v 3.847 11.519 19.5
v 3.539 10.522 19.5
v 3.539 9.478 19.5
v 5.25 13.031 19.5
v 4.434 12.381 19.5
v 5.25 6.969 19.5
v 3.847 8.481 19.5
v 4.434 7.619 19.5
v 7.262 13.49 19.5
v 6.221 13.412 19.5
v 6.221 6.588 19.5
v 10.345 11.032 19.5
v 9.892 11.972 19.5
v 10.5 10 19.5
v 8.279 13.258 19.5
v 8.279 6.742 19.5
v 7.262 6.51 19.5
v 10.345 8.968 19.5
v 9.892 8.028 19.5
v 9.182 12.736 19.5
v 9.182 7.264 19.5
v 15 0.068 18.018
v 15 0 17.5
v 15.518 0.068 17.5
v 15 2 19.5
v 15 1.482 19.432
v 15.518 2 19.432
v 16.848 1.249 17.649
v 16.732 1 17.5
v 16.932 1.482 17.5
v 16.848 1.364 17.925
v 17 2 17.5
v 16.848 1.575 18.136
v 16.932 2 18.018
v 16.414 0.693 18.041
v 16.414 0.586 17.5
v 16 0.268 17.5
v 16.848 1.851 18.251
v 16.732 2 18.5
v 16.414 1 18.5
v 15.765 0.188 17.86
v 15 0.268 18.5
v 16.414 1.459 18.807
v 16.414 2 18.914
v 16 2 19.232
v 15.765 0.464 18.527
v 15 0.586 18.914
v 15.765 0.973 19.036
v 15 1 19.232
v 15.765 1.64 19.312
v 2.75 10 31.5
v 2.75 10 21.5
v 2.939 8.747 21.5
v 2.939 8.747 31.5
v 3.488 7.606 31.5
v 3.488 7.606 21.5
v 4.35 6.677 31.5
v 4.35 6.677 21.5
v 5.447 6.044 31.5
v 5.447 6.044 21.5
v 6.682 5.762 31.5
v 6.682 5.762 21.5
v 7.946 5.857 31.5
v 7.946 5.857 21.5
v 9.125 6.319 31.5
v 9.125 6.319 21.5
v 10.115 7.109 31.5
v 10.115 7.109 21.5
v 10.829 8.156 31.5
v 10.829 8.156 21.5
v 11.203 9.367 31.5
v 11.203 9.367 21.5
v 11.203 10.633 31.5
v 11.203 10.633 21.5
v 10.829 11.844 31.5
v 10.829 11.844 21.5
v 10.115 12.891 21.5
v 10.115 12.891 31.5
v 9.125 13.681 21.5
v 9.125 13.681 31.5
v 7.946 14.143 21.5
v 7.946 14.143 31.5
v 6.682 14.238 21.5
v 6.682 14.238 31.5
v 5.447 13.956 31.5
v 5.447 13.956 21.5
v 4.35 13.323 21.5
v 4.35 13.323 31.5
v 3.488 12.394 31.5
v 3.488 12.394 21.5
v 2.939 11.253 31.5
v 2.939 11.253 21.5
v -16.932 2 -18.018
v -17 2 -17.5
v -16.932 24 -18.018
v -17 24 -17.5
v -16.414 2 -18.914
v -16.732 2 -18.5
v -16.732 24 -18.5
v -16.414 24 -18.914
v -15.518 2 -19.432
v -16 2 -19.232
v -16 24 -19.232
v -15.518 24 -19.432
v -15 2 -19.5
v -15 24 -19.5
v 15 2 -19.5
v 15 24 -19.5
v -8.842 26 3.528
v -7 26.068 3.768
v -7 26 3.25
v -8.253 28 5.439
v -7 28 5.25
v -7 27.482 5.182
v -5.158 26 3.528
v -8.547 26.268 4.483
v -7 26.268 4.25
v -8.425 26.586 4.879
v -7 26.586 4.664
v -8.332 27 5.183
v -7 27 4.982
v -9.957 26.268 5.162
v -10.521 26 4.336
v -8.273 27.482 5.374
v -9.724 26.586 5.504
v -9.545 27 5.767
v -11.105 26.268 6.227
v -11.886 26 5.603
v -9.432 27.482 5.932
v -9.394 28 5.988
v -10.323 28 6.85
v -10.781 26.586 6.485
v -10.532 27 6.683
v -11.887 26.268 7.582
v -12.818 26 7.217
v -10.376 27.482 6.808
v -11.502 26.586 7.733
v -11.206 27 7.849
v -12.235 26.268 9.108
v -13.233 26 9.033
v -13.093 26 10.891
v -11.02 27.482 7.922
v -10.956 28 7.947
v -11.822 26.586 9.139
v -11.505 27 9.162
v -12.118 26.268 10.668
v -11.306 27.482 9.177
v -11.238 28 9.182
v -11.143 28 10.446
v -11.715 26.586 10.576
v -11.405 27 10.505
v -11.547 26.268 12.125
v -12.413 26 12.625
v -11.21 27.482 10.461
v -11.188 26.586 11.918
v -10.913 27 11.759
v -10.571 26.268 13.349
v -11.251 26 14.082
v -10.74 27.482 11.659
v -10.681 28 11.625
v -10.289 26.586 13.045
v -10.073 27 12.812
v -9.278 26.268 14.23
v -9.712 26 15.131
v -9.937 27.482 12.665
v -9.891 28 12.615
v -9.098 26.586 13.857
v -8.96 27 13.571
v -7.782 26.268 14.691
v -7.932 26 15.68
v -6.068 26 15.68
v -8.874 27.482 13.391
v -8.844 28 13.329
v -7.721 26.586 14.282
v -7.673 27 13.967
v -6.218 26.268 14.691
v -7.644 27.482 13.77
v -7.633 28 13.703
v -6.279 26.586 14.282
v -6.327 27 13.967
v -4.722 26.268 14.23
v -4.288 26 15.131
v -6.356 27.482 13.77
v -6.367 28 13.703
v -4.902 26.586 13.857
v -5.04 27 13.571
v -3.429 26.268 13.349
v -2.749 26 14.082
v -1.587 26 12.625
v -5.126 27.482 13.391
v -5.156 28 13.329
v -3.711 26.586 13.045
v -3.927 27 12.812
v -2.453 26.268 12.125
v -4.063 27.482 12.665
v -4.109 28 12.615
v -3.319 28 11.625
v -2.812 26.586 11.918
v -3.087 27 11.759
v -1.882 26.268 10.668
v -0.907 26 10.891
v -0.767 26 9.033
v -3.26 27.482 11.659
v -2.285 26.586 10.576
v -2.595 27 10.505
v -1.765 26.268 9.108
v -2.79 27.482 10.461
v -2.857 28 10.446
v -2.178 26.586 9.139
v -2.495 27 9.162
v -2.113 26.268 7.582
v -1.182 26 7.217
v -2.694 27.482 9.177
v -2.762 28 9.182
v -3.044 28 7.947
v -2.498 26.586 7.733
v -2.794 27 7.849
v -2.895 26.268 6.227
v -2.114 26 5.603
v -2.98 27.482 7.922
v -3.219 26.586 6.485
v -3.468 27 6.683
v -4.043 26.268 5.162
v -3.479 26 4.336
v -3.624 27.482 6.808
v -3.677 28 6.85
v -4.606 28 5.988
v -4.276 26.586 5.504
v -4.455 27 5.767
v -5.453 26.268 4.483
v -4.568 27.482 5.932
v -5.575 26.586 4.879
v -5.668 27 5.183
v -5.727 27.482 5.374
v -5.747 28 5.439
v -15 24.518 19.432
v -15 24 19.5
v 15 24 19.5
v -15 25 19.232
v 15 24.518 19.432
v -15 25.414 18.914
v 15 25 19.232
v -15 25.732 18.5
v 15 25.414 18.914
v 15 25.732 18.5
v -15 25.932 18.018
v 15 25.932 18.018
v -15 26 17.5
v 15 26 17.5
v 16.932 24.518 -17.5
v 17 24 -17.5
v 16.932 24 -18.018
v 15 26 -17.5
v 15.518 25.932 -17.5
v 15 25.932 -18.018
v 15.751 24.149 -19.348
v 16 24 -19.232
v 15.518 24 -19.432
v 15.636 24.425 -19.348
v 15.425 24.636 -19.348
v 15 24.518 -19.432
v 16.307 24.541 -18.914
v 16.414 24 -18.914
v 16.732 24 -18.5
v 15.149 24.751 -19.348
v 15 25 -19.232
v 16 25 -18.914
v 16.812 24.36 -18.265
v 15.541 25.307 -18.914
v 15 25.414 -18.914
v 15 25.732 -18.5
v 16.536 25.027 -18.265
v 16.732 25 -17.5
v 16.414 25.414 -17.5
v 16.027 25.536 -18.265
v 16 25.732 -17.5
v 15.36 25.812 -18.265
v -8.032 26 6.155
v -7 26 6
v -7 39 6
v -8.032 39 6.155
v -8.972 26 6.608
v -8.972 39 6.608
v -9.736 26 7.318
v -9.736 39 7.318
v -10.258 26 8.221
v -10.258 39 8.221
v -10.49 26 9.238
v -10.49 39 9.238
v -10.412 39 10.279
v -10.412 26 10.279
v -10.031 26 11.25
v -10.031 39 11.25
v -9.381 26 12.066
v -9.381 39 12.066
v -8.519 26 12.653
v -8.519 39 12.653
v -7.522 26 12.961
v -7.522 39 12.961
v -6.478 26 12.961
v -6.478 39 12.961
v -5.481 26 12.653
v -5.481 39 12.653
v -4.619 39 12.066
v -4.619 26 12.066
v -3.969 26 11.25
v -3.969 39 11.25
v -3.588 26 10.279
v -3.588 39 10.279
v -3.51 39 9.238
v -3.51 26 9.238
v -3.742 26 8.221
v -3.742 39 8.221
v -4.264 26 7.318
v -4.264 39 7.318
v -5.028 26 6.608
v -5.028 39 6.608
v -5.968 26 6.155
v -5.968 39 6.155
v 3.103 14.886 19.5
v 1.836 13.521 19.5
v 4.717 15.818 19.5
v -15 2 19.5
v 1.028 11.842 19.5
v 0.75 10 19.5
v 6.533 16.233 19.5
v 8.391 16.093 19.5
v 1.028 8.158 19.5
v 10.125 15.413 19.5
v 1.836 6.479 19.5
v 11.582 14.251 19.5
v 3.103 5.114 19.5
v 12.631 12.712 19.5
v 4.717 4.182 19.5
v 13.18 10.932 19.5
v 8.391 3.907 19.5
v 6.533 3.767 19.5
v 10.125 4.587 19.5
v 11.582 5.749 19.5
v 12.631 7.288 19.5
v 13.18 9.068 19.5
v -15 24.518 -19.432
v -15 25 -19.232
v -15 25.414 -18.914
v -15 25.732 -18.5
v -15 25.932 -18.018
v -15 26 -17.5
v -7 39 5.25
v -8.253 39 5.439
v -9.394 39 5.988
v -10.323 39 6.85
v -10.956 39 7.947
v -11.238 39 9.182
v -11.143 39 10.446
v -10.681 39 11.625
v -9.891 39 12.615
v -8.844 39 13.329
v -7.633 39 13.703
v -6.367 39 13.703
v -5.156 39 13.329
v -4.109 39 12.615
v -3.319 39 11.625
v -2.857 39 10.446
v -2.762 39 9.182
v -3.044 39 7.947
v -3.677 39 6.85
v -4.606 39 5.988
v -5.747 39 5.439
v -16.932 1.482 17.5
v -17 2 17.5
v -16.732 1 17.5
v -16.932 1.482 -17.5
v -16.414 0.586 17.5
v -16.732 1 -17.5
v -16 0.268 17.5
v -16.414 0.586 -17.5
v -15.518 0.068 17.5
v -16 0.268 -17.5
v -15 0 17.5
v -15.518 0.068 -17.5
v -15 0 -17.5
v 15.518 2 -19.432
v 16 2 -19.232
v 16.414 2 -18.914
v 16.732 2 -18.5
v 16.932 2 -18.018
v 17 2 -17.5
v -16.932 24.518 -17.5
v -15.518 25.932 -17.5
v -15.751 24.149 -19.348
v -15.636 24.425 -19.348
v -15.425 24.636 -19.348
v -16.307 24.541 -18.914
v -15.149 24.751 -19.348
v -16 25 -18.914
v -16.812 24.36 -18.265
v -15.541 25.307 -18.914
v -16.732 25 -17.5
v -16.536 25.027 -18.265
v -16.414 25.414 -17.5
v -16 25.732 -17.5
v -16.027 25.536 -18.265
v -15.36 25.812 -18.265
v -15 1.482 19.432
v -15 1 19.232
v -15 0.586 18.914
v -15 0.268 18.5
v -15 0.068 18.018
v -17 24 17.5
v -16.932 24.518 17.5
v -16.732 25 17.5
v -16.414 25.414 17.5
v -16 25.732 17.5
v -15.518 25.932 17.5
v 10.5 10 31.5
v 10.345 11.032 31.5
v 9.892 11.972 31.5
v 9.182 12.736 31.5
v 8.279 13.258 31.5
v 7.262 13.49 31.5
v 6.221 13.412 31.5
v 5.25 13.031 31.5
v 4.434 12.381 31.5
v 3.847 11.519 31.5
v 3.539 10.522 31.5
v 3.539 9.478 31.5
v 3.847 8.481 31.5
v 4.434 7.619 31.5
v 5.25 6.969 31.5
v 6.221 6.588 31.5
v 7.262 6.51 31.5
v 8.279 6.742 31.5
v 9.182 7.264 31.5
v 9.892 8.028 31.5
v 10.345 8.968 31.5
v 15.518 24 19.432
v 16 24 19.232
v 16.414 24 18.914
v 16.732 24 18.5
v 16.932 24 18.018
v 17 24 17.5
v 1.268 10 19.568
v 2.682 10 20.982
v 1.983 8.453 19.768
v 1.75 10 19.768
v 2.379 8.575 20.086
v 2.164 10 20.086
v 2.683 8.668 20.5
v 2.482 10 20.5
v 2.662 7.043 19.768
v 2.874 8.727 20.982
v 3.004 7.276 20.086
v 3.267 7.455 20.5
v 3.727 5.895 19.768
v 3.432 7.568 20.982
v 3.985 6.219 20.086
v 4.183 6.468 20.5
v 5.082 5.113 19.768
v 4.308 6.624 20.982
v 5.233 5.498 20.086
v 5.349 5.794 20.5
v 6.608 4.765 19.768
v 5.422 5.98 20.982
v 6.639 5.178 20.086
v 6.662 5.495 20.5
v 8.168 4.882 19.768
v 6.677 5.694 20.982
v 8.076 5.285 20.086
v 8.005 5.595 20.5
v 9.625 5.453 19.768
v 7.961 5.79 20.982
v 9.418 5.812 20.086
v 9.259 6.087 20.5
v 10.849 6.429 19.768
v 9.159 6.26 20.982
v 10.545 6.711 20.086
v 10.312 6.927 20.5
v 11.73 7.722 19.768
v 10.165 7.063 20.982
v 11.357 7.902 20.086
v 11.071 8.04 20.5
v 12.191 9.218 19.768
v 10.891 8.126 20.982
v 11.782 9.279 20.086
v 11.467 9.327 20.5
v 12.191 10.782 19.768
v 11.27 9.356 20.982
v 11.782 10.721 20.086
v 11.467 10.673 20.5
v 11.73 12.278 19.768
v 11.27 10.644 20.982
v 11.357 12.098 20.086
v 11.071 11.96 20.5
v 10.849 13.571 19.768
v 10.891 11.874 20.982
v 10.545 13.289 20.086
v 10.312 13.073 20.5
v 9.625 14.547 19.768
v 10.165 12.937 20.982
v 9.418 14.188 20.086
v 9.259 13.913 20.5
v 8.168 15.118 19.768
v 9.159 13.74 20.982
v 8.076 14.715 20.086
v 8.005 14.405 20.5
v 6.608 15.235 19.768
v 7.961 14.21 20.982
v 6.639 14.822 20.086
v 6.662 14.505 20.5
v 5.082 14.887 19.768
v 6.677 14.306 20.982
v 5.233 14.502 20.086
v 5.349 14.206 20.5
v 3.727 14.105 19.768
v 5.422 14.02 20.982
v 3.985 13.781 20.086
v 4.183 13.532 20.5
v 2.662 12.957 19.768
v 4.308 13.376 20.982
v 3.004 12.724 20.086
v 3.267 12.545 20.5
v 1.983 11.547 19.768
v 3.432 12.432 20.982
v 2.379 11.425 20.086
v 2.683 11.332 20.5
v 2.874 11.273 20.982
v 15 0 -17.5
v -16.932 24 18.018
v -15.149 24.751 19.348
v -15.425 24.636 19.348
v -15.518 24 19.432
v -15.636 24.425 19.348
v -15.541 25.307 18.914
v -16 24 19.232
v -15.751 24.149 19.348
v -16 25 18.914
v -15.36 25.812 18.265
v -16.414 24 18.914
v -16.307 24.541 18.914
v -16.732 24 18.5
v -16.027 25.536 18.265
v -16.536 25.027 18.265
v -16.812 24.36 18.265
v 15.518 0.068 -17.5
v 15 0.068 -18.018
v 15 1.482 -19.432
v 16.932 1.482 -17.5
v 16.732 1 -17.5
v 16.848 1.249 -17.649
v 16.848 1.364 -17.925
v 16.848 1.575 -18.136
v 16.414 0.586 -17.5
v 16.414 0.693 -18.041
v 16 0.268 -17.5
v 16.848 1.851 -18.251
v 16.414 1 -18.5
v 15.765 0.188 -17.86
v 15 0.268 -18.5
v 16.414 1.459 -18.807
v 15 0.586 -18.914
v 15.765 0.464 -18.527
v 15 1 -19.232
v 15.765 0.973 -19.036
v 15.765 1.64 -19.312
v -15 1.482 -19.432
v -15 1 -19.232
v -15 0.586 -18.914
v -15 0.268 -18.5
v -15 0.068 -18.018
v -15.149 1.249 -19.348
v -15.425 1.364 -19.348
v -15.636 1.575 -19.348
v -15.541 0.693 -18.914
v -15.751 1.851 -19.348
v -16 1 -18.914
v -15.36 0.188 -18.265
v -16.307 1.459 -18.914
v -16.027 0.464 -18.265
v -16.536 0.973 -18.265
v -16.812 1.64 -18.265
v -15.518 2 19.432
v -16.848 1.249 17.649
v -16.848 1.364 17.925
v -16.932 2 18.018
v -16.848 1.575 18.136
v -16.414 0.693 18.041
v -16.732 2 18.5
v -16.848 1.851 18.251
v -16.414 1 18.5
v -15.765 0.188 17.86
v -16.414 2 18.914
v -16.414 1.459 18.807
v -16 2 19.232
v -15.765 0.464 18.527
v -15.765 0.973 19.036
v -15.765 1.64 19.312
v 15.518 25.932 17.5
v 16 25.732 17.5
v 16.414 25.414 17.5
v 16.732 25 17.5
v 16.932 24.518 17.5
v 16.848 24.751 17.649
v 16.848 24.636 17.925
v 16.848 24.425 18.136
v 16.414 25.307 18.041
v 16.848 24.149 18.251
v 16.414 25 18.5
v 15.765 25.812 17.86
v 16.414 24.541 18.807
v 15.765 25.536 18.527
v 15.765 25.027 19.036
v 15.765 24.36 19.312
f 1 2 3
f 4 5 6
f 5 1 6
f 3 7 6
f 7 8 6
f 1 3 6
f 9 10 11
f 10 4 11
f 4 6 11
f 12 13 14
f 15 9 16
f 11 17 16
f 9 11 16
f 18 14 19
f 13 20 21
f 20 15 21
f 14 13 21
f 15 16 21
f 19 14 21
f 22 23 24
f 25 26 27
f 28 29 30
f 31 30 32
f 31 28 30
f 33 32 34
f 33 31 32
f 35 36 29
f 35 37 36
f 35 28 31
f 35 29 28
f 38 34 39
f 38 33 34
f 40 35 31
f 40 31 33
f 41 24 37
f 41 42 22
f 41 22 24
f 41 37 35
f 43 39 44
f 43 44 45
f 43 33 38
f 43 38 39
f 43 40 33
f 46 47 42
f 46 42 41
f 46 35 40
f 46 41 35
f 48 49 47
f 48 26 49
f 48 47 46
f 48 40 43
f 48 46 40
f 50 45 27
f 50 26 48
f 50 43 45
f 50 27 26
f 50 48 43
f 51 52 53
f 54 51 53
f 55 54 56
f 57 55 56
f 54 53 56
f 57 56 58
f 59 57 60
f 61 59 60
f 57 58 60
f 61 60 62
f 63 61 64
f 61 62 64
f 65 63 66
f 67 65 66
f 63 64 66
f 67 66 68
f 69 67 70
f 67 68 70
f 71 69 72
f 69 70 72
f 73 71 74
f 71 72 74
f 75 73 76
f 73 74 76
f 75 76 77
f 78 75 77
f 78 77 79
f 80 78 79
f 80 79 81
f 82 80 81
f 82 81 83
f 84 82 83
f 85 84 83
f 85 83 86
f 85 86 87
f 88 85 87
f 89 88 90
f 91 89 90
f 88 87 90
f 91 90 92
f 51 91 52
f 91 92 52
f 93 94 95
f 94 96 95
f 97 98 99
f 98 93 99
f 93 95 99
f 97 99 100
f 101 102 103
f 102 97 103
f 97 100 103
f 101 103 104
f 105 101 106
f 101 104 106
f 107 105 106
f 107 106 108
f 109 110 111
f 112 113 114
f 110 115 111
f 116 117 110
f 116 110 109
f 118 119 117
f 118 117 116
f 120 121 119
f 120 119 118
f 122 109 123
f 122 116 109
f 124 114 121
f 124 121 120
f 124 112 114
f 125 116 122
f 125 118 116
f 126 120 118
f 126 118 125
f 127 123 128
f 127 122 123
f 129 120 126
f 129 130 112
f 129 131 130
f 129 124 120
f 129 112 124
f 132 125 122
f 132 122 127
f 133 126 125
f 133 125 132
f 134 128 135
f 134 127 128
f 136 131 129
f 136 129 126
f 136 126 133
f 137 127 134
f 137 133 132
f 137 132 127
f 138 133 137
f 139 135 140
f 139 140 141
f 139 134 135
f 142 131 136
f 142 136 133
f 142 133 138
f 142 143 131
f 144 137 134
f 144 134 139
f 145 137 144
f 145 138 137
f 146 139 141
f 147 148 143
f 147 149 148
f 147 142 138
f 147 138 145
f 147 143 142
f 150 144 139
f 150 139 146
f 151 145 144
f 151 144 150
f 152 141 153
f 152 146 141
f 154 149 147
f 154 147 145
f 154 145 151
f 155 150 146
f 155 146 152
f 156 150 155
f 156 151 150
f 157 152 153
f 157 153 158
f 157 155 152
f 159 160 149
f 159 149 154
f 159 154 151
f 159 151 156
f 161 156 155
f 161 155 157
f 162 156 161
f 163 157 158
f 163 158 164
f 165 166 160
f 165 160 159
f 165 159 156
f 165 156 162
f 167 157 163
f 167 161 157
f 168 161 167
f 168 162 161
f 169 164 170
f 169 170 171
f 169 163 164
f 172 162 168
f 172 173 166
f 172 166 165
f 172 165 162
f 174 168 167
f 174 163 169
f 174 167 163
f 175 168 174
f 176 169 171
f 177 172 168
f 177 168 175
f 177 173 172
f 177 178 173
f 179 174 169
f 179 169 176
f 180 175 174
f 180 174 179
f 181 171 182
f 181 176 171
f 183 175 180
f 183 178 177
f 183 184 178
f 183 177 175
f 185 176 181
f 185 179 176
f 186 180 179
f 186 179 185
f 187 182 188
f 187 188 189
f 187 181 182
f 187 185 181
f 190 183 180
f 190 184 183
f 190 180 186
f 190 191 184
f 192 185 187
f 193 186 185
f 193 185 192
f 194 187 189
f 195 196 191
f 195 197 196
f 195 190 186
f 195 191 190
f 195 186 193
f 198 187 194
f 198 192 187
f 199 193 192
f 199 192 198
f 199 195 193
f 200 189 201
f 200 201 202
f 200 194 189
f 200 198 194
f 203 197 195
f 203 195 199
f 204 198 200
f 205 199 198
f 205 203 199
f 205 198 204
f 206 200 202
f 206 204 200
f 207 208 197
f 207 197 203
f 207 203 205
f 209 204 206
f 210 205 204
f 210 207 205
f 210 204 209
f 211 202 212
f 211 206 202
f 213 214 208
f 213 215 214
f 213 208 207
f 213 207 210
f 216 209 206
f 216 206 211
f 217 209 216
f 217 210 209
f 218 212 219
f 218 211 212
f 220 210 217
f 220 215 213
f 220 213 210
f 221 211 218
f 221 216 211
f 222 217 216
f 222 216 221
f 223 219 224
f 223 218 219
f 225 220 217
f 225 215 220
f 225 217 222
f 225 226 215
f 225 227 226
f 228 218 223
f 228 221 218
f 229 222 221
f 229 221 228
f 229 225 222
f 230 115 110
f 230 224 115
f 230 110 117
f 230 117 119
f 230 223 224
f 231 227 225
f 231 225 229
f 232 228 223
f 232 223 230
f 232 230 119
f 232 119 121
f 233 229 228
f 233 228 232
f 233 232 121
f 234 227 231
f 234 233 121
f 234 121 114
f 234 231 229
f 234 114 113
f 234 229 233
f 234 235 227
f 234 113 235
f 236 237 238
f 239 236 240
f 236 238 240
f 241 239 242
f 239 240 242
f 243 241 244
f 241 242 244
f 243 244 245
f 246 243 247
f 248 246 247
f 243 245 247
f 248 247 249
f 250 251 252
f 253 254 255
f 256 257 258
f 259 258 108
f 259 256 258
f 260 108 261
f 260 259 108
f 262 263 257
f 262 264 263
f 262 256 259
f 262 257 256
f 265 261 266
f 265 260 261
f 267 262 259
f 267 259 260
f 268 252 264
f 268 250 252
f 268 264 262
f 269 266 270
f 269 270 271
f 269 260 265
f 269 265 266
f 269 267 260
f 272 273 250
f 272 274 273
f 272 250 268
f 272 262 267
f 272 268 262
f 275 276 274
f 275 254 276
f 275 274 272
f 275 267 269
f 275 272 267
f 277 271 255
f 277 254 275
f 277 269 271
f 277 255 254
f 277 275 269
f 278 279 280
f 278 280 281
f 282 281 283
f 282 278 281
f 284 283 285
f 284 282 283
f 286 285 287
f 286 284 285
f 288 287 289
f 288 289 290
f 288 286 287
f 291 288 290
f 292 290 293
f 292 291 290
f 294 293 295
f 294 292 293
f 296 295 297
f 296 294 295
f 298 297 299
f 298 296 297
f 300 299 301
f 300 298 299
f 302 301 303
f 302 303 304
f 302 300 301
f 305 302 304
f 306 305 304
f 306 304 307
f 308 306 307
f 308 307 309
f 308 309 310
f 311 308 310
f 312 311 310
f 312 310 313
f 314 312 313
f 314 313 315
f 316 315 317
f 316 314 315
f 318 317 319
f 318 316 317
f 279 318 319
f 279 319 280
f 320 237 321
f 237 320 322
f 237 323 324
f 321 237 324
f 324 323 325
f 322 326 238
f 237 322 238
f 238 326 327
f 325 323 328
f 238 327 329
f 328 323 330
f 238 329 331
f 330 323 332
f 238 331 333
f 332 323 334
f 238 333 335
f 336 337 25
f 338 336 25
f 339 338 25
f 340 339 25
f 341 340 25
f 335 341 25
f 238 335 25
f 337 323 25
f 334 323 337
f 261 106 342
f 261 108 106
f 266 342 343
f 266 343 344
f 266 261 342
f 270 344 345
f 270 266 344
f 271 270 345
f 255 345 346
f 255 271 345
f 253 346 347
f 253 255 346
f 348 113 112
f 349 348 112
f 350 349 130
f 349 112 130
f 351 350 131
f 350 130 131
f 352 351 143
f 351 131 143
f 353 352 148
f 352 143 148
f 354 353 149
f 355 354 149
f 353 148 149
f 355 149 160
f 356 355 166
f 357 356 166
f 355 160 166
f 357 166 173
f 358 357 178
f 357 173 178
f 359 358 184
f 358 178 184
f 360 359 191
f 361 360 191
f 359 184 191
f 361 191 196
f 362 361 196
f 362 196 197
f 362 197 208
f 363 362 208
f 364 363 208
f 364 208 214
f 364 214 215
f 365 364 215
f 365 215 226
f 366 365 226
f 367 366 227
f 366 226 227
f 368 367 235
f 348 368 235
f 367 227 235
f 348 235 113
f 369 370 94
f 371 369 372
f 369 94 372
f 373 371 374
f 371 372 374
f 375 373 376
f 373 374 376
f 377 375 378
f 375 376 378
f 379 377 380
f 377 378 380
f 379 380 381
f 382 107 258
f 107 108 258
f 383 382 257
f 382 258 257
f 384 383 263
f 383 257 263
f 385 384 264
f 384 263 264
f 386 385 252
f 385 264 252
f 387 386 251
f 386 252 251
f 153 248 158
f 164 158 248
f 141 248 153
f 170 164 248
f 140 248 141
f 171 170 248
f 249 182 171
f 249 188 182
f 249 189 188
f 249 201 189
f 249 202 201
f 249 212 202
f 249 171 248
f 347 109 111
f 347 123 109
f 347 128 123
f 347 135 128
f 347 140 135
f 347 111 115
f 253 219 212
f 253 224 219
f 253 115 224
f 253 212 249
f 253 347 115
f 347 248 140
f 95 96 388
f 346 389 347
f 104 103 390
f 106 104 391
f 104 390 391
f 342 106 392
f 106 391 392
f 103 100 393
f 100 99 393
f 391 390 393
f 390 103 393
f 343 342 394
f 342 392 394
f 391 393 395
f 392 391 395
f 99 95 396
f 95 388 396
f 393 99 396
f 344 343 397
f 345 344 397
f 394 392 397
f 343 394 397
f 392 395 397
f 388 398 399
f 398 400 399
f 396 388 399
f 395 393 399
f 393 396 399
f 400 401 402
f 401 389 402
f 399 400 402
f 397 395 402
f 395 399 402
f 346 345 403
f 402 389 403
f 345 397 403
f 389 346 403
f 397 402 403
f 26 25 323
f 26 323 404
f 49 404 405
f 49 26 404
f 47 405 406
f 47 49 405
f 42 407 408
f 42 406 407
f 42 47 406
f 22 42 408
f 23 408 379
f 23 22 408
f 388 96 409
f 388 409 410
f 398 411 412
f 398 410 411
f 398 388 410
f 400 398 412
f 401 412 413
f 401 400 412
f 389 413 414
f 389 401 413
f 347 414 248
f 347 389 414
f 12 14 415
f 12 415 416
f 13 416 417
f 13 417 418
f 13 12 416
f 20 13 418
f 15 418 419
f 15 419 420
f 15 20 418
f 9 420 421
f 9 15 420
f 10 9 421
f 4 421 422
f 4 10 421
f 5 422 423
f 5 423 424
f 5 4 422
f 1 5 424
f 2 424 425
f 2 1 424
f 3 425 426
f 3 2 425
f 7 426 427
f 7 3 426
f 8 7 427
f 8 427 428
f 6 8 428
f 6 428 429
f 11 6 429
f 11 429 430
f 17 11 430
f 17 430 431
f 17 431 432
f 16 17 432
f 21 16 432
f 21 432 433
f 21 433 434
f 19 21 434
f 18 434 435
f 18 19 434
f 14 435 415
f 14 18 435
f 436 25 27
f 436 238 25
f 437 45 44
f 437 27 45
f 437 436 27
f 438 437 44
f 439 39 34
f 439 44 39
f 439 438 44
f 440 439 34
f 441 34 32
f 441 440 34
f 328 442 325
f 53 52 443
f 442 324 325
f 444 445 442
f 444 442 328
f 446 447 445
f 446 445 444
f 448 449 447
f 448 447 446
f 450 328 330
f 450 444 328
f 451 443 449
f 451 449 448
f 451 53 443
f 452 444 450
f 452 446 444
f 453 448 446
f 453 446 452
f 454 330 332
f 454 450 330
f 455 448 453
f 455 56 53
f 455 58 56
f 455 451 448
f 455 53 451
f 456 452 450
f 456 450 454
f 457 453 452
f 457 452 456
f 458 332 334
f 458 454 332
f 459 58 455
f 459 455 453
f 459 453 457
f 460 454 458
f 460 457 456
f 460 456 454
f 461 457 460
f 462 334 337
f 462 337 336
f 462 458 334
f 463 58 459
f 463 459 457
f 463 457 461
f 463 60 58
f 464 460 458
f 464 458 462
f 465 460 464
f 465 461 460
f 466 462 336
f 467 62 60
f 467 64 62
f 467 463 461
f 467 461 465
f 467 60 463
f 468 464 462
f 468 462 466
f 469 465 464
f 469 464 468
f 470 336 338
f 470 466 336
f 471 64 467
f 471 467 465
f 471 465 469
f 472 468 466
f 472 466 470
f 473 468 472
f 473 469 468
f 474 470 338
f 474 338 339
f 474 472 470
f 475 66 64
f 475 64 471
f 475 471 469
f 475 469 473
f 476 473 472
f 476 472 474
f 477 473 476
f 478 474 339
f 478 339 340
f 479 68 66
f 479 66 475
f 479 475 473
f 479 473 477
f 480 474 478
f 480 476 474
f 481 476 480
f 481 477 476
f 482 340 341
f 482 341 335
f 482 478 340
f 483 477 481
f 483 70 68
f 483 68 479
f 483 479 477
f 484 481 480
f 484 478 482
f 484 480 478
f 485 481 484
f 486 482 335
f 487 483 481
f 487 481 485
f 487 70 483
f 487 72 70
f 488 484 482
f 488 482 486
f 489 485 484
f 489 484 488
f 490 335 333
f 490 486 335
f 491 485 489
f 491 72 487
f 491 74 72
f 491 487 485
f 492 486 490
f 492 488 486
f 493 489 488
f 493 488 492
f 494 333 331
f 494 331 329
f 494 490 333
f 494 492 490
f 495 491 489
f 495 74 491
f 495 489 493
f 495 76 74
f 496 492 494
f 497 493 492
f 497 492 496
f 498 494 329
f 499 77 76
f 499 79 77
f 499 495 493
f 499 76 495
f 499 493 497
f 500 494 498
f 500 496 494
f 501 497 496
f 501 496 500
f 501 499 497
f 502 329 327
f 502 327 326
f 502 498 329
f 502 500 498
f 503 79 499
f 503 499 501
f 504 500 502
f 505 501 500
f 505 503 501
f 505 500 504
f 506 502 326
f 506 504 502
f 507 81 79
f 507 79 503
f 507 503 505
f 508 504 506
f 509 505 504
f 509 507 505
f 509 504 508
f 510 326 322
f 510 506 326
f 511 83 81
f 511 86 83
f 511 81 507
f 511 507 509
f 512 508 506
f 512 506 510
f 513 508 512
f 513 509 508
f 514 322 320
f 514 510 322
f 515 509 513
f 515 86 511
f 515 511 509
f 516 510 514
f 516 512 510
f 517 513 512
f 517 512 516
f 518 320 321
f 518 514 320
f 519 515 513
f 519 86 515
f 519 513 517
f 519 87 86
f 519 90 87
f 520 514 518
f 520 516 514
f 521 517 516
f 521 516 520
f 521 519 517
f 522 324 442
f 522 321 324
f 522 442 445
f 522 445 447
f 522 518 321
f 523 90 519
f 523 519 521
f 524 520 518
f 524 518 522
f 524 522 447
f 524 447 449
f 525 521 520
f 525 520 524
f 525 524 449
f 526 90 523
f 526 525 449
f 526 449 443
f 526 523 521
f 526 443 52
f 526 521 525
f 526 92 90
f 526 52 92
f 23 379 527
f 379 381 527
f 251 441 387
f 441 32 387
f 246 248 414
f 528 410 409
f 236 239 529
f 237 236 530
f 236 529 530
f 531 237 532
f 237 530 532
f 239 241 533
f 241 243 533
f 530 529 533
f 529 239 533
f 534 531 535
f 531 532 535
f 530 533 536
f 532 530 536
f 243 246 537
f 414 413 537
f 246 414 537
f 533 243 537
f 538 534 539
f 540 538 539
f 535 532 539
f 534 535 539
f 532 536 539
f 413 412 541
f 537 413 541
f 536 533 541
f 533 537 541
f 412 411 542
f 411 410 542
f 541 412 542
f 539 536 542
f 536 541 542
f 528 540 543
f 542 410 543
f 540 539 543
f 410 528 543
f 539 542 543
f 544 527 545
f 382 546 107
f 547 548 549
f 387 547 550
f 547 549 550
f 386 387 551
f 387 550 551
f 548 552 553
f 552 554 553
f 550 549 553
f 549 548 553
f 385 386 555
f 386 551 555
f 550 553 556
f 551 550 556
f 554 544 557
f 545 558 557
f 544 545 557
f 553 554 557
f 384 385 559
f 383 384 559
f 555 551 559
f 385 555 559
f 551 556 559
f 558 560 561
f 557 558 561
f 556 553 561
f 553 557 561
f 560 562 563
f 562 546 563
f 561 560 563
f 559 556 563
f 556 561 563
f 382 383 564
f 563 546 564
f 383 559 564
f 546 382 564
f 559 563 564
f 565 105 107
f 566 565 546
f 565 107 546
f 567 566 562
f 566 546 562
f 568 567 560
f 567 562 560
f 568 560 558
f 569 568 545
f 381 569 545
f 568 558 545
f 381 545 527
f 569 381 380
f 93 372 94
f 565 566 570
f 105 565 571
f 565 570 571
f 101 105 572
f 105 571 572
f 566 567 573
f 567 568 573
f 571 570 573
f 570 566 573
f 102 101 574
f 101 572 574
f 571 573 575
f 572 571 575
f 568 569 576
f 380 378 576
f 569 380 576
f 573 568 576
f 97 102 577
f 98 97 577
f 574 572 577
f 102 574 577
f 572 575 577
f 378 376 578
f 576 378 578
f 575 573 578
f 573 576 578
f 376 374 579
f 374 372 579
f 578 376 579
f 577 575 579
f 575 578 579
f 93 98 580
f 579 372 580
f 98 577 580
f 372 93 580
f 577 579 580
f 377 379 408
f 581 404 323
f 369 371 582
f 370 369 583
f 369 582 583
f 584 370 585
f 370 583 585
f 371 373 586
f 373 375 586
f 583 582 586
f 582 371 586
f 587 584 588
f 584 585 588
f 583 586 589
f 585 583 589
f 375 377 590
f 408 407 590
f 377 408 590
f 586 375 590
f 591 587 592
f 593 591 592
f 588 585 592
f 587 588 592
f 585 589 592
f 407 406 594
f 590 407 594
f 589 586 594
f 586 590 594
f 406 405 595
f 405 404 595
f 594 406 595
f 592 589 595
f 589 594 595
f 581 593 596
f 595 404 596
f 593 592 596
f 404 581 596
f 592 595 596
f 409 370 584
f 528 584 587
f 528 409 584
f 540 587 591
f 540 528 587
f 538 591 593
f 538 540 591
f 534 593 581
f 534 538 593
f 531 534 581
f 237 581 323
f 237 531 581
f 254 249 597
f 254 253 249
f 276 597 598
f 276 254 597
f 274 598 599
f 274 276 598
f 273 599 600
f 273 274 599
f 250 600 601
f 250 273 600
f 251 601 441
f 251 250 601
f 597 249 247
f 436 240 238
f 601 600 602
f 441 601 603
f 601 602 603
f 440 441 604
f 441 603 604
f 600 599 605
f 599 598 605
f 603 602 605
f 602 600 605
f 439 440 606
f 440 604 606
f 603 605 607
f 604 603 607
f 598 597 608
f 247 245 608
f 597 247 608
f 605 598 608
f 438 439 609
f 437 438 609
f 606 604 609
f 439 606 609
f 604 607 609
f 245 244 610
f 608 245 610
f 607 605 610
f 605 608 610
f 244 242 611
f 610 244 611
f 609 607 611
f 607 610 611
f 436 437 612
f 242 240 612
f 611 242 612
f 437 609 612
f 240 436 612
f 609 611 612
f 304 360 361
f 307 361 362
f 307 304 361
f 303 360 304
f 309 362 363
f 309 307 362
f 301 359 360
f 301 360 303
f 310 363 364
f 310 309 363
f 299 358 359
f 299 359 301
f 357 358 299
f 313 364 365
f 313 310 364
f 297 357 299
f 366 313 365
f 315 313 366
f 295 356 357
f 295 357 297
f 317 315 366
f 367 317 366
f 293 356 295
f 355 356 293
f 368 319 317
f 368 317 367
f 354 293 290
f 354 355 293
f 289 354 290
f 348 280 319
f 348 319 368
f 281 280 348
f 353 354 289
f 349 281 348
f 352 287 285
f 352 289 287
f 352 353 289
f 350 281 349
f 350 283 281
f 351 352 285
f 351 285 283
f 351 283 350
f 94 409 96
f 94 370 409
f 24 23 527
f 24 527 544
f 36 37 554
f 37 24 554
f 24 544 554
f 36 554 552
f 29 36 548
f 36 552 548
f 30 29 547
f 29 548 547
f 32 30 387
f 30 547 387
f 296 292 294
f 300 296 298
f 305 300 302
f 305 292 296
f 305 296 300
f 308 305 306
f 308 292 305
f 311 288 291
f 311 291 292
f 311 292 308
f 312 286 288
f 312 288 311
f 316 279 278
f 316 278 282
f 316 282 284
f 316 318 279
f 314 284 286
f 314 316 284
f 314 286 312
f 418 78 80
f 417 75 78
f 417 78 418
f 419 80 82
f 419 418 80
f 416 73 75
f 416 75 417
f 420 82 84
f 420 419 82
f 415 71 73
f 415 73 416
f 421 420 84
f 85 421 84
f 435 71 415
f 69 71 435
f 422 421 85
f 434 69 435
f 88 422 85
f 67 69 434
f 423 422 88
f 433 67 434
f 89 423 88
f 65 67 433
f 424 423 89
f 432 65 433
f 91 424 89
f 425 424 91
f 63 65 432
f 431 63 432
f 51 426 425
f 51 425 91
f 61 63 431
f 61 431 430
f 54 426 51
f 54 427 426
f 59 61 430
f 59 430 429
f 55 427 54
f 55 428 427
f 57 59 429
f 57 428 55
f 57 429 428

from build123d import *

# Parameters (mm, degrees)
SKETCH1_W           = 34
SKETCH1_H           = 39
BOSS_EXTRUDE1_DEPTH = 26
SKETCH2_R           = 4.25
SKETCH2_R_2         = 3.5
BOSS_EXTRUDE2_DEPTH = 13
SKETCH3_R           = 4.25
SKETCH3_R_2         = 3.5
BOSS_EXTRUDE4_DEPTH = 12
FILLET1_R           = 2
FILLET3_R           = 2
SKETCH5_R           = 2.5
BOSS_EXTRUDE5_DEPTH = 2


with BuildPart() as part:
    # Sketch1 → Boss-Extrude1 (new body)
    with BuildSketch(Plane(origin=(0, 0, 0), x_dir=(1, 0, 0), z_dir=(0, 1, 0))):
        Rectangle(SKETCH1_W, SKETCH1_H)
    extrude(amount=BOSS_EXTRUDE1_DEPTH)

    # Sketch2 → Boss-Extrude2 (add)
    with BuildSketch(Plane(origin=(0, 26, 0), x_dir=(1, 0, 0), z_dir=(0, 1, 0))):
        with Locations(Location((-7, -9.5, 0), (0, 0, 90))):
            Circle(SKETCH2_R)
        with Locations(Location((-7, -9.5, 0), (0, 0, 90))):
            Circle(SKETCH2_R_2, mode=Mode.SUBTRACT)
    extrude(amount=BOSS_EXTRUDE2_DEPTH)

    # Sketch3 → Boss-Extrude4 (add)
    with BuildSketch(Plane.XY.offset(19.5)):
        with Locations(Location((7, 10, 0), (0, 0, 180))):
            Circle(SKETCH3_R)
        with Locations((7, 10)):
            Circle(SKETCH3_R_2, mode=Mode.SUBTRACT)
    extrude(amount=BOSS_EXTRUDE4_DEPTH)

    # Fillet1
    fillet1_edges = [part.edges().sort_by_distance(p)[0] for p in [
        (-17, 26, 0),
        (0, 26, 19.5),
        (17, 26, 0),
        (0, 0, 19.5),
        (-17, 0, 0),
        (0, 0, -19.5),
        (17, 0, 0),
        (17, 13, 19.5),
        (-17, 13, 19.5),
        (-17, 13, -19.5),
        (17, 13, -19.5),
        (0, 26, -19.5),
    ]]
    fillet(fillet1_edges, radius=FILLET1_R)

    # Fillet3
    fillet3_edges = [part.edges().sort_by_distance(p)[0] for p in [
        (-7, 26, 13.75),
        (11.25, 10, 19.5),
    ]]
    fillet(fillet3_edges, radius=FILLET3_R)

    # Sketch5 → Boss-Extrude5 (add)
    with BuildSketch(Plane.XZ):
        Polygon((-15, -6), (-15, 0), (-15, 6), (-27, 6), (-27, -6), align=None)
        with Locations((-22.5, 0)):
            Circle(SKETCH5_R, mode=Mode.SUBTRACT)
        Polygon((15, 6), (15, 0), (15, -6), (27, -6), (27, 6), align=None)
        with BuildLine():
            ThreePointArc((25, 0), (22.5, -2.5), (20, 0))
            ThreePointArc((20, 0), (22.5, 2.5), (25, 0))
        make_face(mode=Mode.SUBTRACT)
    extrude(amount=BOSS_EXTRUDE5_DEPTH)


with BuildPart() as boss_extrude5_kept_piece:
    # of the separate pieces the step leaves, the one the design keeps (boss_extrude5_pieces_kept)
    add(part.part.solids().sort_by_distance((0.75, 10, 19.5))[0])


solid = boss_extrude5_kept_piece.part
